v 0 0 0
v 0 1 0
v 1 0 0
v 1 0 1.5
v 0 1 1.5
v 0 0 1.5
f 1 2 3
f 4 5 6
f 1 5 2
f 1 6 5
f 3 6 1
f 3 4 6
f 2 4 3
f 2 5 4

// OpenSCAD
// file: shortcuts.scad
//include </u/a/3dprint/alanlib/shortcuts.scad>;
//include <shortcuts.scad>  <- only works if run from terminal
module R(v) {rotate(v) children();}
module T(v) {translate(v) children();}
module S(v) {scale(v) children();}
module Rx(a=90) {rotate([a, 0, 0]) children();}
module Ry(a=90) {rotate([0, a, 0]) children();}
module Rz(a=90) {rotate([0, 0, a]) children();}
module Tx(d) {translate([d, 0, 0]) children();}
module Ty(d) {translate([0, d, 0]) children();}
module Tz(d) {translate([0, 0, d]) children();}
module Sx(s) {scale([s, 1, 1]) children();}
module Sy(s) {scale([1, s, 1]) children();}
module Sz(s) {scale([1, 1, s]) children();}

// TODO: rename this to utils.scad
// TODO: create shapes.scad, move stuff there

mm_per_in = 25.4;
eps = .001;
phi = (sqrt(5)+1)/2; // useful for regular solids
O = 0; // silly sugar for hiding syntax highlighting

module brim_scale(s = [0.9, 1.1], height=.3) {
    // to be used for objects with multiply-connected footprints - 
    // the minkowski method doesn't work well for that case
    //
    // designed to work for objects that :
    // - rest on the x-y plane
    // - are somewhat centered on the origin
    union() {
        children();
        linear_extrude(height=height)
        difference() {
            scale([s[1], s[1], s[0]]) hull() projection(cut=true) children();
            scale([s[0], s[0], s[1]]) hull() projection(cut=true) children();
        }
    }
}

module dremel_footprint() {
    difference() {
        cube([232, 152, 1], center=true);
        cube([230, 150, 2], center=true);
    }
}

module brim_minkowski(radius=10, height=.3) {
    // i think this produces the "right" result for objects with simply-connected footprints.
    // nonconvex objects with narrow crevices might not do well.
    //
    // designed to work for objects that:
    // - rest on the x-y plane (?)
    // - have simply-connected footprints
    union() {
        minkowski() {
            linear_extrude(height=eps)
                projection(cut=true)
                    children();
            cylinder(r=radius, h=height-eps);
        }
        children();
    }
}

module trapezoid_arbitrary_3d(base_width, top_width, height, offs, thickness) {
    // assumes base_width > top_width
    linear_extrude(height=thickness) {
        polygon([[0, 0], 
                 [offs, height], 
                 [offs+top_width, height], 
                 [base_width, 0]]);
    }
}

module trapezoid_3d(base_width, top_width, height, thickness) {
    trapezoid_arbitrary_3d(base_width, top_width, height, (base_width-top_width)/2, thickness);
}

module pill3(r=1, l=1) {
    union() {
        cylinder(r=r, h=l, $fn=64);
        sphere(r=r, $fn=64);
        translate([0, 0, l]) sphere(r=r, $fn=64);
    }
}

module pill2(r=1, l=2, h=.5) {
    linear_extrude(height=h) {
        translate([-r, 0, 0]) square([r*2, l]);
        circle(r, $fn=64);
        translate([0, l, 0]) circle(r, $fn=64);
    }
}

module pill2D(r=1, l=2) {
    translate([-r, 0, 0]) square([r*2, l]);
    circle(r, $fn=64);
    translate([0, l, 0]) circle(r, $fn=64);
}

module rounded_square(dim=[3, 3], r=1, h=1, $fn=64) {
    linear_extrude(height=h) {
        union() {
            translate([-r, 0]) square(dim + [2*r, 0]); 
            translate([0, -r]) square(dim + [0, 2*r]);
            translate([0, 0]) circle(r, $fn);
            translate([0, dim[1]]) circle(r, $fn);
            translate([dim[0], 0]) circle(r, $fn);
            translate([dim[0], dim[1]]) circle(r, $fn);
        }
    }
}

module rounded_cube(dim=[3, 3, 3], r=1, $fn=64) {
    union() {
        // cubes
        translate([-r, 0, 0]) cube(dim + [2*r, 0, 0]);
        translate([0, -r, 0]) cube(dim + [0, 2*r, 0]);
        translate([0, 0, -r]) cube(dim + [0, 0, 2*r]);
        // spheres
        translate([0, 0, 0]) sphere(r, $fn);
        translate([dim[0], 0, 0]) sphere(r, $fn);
        translate([0, dim[1], 0]) sphere(r, $fn);
        translate([dim[0], dim[1], 0]) sphere(r, $fn);
        translate([0, 0, dim[2]]) sphere(r, $fn);
        translate([dim[0], 0, dim[2]]) sphere(r, $fn);
        translate([0, dim[1], dim[2]]) sphere(r, $fn);
        translate([dim[0], dim[1], dim[2]]) sphere(r, $fn);
        // cylinders
        translate([0, 0, 0]) cylinder(r=r, h=dim[0], $fn);
    }
}



module test_object() {
    union() {
        cube([30, 10, 10]);
        cube([10, 30, 10]);
    }
}    

//test_object();
//brim_minkowski() test_object();
//brim_scale() test_object();
//brim_scale() {test_object();}


// material/process constants
// thickness = 2 -> notch width = 2.4
ACRYLIC_60mil = 1.5;
LASER_KERF_ACRYLIC_60mil = .3; 
// this is an adjustment to the material width which accounts for
// the small amount of material lost in the cut.
// not sure yet whether this depends on the material/thickness.
// i suspect that it might depend on the laser power/speed,
// which is determined by the material/thickness


module laser_fiducial() {
    polygon([[0, 0], [0, 1], [1, 0]]);    
}



































// workaround for buggy line counts in error messages
echo("200 lines in shortcuts.scad");
// main file
include <shortcuts.scad>

epsilon = .005;
$fn = 128;
t = ACRYLIC_60mil;
t_notch = t - LASER_KERF_ACRYLIC_60mil; 

module reference() {
    // define reference objects, not to be included in cut
}

module object_2d() {
    // define object to be cut out with laser
    // use 2D primitives here
}

module shape_2d() {
    // define object to be etched with laser
    // use 2D primitives here
}

module object_3d() {
    // convert 2D shapes to 3D for visual design aid
    linear_extrude(height=t) {
        object_2d();
    }
}

module assembled() {
    // assemble parts of project in real 3D configuration
    object_3d();
}

module flat_cut() {
    // assemble parts of project in 2D layout suitable for laser bed
    laser_fiducial();
    object_2d();
}

module flat_etch() {
    // assemble etch layer parts
    shape_2d();
}



// the following block should not need to be modified, 
// except to add additional etch layers
MODE="design";  // {"design", "cut", "etch"}
if(MODE=="design") {
    #reference();
    assembled();
    linear_extrude(height=t) flat_cut();
    #Tz(t/2+epsilon) linear_extrude(height=t/2) flat_etch();
} else if(MODE=="cut") {
    flat_cut();
} else if(MODE=="etch") {
    flat_etch();
}
